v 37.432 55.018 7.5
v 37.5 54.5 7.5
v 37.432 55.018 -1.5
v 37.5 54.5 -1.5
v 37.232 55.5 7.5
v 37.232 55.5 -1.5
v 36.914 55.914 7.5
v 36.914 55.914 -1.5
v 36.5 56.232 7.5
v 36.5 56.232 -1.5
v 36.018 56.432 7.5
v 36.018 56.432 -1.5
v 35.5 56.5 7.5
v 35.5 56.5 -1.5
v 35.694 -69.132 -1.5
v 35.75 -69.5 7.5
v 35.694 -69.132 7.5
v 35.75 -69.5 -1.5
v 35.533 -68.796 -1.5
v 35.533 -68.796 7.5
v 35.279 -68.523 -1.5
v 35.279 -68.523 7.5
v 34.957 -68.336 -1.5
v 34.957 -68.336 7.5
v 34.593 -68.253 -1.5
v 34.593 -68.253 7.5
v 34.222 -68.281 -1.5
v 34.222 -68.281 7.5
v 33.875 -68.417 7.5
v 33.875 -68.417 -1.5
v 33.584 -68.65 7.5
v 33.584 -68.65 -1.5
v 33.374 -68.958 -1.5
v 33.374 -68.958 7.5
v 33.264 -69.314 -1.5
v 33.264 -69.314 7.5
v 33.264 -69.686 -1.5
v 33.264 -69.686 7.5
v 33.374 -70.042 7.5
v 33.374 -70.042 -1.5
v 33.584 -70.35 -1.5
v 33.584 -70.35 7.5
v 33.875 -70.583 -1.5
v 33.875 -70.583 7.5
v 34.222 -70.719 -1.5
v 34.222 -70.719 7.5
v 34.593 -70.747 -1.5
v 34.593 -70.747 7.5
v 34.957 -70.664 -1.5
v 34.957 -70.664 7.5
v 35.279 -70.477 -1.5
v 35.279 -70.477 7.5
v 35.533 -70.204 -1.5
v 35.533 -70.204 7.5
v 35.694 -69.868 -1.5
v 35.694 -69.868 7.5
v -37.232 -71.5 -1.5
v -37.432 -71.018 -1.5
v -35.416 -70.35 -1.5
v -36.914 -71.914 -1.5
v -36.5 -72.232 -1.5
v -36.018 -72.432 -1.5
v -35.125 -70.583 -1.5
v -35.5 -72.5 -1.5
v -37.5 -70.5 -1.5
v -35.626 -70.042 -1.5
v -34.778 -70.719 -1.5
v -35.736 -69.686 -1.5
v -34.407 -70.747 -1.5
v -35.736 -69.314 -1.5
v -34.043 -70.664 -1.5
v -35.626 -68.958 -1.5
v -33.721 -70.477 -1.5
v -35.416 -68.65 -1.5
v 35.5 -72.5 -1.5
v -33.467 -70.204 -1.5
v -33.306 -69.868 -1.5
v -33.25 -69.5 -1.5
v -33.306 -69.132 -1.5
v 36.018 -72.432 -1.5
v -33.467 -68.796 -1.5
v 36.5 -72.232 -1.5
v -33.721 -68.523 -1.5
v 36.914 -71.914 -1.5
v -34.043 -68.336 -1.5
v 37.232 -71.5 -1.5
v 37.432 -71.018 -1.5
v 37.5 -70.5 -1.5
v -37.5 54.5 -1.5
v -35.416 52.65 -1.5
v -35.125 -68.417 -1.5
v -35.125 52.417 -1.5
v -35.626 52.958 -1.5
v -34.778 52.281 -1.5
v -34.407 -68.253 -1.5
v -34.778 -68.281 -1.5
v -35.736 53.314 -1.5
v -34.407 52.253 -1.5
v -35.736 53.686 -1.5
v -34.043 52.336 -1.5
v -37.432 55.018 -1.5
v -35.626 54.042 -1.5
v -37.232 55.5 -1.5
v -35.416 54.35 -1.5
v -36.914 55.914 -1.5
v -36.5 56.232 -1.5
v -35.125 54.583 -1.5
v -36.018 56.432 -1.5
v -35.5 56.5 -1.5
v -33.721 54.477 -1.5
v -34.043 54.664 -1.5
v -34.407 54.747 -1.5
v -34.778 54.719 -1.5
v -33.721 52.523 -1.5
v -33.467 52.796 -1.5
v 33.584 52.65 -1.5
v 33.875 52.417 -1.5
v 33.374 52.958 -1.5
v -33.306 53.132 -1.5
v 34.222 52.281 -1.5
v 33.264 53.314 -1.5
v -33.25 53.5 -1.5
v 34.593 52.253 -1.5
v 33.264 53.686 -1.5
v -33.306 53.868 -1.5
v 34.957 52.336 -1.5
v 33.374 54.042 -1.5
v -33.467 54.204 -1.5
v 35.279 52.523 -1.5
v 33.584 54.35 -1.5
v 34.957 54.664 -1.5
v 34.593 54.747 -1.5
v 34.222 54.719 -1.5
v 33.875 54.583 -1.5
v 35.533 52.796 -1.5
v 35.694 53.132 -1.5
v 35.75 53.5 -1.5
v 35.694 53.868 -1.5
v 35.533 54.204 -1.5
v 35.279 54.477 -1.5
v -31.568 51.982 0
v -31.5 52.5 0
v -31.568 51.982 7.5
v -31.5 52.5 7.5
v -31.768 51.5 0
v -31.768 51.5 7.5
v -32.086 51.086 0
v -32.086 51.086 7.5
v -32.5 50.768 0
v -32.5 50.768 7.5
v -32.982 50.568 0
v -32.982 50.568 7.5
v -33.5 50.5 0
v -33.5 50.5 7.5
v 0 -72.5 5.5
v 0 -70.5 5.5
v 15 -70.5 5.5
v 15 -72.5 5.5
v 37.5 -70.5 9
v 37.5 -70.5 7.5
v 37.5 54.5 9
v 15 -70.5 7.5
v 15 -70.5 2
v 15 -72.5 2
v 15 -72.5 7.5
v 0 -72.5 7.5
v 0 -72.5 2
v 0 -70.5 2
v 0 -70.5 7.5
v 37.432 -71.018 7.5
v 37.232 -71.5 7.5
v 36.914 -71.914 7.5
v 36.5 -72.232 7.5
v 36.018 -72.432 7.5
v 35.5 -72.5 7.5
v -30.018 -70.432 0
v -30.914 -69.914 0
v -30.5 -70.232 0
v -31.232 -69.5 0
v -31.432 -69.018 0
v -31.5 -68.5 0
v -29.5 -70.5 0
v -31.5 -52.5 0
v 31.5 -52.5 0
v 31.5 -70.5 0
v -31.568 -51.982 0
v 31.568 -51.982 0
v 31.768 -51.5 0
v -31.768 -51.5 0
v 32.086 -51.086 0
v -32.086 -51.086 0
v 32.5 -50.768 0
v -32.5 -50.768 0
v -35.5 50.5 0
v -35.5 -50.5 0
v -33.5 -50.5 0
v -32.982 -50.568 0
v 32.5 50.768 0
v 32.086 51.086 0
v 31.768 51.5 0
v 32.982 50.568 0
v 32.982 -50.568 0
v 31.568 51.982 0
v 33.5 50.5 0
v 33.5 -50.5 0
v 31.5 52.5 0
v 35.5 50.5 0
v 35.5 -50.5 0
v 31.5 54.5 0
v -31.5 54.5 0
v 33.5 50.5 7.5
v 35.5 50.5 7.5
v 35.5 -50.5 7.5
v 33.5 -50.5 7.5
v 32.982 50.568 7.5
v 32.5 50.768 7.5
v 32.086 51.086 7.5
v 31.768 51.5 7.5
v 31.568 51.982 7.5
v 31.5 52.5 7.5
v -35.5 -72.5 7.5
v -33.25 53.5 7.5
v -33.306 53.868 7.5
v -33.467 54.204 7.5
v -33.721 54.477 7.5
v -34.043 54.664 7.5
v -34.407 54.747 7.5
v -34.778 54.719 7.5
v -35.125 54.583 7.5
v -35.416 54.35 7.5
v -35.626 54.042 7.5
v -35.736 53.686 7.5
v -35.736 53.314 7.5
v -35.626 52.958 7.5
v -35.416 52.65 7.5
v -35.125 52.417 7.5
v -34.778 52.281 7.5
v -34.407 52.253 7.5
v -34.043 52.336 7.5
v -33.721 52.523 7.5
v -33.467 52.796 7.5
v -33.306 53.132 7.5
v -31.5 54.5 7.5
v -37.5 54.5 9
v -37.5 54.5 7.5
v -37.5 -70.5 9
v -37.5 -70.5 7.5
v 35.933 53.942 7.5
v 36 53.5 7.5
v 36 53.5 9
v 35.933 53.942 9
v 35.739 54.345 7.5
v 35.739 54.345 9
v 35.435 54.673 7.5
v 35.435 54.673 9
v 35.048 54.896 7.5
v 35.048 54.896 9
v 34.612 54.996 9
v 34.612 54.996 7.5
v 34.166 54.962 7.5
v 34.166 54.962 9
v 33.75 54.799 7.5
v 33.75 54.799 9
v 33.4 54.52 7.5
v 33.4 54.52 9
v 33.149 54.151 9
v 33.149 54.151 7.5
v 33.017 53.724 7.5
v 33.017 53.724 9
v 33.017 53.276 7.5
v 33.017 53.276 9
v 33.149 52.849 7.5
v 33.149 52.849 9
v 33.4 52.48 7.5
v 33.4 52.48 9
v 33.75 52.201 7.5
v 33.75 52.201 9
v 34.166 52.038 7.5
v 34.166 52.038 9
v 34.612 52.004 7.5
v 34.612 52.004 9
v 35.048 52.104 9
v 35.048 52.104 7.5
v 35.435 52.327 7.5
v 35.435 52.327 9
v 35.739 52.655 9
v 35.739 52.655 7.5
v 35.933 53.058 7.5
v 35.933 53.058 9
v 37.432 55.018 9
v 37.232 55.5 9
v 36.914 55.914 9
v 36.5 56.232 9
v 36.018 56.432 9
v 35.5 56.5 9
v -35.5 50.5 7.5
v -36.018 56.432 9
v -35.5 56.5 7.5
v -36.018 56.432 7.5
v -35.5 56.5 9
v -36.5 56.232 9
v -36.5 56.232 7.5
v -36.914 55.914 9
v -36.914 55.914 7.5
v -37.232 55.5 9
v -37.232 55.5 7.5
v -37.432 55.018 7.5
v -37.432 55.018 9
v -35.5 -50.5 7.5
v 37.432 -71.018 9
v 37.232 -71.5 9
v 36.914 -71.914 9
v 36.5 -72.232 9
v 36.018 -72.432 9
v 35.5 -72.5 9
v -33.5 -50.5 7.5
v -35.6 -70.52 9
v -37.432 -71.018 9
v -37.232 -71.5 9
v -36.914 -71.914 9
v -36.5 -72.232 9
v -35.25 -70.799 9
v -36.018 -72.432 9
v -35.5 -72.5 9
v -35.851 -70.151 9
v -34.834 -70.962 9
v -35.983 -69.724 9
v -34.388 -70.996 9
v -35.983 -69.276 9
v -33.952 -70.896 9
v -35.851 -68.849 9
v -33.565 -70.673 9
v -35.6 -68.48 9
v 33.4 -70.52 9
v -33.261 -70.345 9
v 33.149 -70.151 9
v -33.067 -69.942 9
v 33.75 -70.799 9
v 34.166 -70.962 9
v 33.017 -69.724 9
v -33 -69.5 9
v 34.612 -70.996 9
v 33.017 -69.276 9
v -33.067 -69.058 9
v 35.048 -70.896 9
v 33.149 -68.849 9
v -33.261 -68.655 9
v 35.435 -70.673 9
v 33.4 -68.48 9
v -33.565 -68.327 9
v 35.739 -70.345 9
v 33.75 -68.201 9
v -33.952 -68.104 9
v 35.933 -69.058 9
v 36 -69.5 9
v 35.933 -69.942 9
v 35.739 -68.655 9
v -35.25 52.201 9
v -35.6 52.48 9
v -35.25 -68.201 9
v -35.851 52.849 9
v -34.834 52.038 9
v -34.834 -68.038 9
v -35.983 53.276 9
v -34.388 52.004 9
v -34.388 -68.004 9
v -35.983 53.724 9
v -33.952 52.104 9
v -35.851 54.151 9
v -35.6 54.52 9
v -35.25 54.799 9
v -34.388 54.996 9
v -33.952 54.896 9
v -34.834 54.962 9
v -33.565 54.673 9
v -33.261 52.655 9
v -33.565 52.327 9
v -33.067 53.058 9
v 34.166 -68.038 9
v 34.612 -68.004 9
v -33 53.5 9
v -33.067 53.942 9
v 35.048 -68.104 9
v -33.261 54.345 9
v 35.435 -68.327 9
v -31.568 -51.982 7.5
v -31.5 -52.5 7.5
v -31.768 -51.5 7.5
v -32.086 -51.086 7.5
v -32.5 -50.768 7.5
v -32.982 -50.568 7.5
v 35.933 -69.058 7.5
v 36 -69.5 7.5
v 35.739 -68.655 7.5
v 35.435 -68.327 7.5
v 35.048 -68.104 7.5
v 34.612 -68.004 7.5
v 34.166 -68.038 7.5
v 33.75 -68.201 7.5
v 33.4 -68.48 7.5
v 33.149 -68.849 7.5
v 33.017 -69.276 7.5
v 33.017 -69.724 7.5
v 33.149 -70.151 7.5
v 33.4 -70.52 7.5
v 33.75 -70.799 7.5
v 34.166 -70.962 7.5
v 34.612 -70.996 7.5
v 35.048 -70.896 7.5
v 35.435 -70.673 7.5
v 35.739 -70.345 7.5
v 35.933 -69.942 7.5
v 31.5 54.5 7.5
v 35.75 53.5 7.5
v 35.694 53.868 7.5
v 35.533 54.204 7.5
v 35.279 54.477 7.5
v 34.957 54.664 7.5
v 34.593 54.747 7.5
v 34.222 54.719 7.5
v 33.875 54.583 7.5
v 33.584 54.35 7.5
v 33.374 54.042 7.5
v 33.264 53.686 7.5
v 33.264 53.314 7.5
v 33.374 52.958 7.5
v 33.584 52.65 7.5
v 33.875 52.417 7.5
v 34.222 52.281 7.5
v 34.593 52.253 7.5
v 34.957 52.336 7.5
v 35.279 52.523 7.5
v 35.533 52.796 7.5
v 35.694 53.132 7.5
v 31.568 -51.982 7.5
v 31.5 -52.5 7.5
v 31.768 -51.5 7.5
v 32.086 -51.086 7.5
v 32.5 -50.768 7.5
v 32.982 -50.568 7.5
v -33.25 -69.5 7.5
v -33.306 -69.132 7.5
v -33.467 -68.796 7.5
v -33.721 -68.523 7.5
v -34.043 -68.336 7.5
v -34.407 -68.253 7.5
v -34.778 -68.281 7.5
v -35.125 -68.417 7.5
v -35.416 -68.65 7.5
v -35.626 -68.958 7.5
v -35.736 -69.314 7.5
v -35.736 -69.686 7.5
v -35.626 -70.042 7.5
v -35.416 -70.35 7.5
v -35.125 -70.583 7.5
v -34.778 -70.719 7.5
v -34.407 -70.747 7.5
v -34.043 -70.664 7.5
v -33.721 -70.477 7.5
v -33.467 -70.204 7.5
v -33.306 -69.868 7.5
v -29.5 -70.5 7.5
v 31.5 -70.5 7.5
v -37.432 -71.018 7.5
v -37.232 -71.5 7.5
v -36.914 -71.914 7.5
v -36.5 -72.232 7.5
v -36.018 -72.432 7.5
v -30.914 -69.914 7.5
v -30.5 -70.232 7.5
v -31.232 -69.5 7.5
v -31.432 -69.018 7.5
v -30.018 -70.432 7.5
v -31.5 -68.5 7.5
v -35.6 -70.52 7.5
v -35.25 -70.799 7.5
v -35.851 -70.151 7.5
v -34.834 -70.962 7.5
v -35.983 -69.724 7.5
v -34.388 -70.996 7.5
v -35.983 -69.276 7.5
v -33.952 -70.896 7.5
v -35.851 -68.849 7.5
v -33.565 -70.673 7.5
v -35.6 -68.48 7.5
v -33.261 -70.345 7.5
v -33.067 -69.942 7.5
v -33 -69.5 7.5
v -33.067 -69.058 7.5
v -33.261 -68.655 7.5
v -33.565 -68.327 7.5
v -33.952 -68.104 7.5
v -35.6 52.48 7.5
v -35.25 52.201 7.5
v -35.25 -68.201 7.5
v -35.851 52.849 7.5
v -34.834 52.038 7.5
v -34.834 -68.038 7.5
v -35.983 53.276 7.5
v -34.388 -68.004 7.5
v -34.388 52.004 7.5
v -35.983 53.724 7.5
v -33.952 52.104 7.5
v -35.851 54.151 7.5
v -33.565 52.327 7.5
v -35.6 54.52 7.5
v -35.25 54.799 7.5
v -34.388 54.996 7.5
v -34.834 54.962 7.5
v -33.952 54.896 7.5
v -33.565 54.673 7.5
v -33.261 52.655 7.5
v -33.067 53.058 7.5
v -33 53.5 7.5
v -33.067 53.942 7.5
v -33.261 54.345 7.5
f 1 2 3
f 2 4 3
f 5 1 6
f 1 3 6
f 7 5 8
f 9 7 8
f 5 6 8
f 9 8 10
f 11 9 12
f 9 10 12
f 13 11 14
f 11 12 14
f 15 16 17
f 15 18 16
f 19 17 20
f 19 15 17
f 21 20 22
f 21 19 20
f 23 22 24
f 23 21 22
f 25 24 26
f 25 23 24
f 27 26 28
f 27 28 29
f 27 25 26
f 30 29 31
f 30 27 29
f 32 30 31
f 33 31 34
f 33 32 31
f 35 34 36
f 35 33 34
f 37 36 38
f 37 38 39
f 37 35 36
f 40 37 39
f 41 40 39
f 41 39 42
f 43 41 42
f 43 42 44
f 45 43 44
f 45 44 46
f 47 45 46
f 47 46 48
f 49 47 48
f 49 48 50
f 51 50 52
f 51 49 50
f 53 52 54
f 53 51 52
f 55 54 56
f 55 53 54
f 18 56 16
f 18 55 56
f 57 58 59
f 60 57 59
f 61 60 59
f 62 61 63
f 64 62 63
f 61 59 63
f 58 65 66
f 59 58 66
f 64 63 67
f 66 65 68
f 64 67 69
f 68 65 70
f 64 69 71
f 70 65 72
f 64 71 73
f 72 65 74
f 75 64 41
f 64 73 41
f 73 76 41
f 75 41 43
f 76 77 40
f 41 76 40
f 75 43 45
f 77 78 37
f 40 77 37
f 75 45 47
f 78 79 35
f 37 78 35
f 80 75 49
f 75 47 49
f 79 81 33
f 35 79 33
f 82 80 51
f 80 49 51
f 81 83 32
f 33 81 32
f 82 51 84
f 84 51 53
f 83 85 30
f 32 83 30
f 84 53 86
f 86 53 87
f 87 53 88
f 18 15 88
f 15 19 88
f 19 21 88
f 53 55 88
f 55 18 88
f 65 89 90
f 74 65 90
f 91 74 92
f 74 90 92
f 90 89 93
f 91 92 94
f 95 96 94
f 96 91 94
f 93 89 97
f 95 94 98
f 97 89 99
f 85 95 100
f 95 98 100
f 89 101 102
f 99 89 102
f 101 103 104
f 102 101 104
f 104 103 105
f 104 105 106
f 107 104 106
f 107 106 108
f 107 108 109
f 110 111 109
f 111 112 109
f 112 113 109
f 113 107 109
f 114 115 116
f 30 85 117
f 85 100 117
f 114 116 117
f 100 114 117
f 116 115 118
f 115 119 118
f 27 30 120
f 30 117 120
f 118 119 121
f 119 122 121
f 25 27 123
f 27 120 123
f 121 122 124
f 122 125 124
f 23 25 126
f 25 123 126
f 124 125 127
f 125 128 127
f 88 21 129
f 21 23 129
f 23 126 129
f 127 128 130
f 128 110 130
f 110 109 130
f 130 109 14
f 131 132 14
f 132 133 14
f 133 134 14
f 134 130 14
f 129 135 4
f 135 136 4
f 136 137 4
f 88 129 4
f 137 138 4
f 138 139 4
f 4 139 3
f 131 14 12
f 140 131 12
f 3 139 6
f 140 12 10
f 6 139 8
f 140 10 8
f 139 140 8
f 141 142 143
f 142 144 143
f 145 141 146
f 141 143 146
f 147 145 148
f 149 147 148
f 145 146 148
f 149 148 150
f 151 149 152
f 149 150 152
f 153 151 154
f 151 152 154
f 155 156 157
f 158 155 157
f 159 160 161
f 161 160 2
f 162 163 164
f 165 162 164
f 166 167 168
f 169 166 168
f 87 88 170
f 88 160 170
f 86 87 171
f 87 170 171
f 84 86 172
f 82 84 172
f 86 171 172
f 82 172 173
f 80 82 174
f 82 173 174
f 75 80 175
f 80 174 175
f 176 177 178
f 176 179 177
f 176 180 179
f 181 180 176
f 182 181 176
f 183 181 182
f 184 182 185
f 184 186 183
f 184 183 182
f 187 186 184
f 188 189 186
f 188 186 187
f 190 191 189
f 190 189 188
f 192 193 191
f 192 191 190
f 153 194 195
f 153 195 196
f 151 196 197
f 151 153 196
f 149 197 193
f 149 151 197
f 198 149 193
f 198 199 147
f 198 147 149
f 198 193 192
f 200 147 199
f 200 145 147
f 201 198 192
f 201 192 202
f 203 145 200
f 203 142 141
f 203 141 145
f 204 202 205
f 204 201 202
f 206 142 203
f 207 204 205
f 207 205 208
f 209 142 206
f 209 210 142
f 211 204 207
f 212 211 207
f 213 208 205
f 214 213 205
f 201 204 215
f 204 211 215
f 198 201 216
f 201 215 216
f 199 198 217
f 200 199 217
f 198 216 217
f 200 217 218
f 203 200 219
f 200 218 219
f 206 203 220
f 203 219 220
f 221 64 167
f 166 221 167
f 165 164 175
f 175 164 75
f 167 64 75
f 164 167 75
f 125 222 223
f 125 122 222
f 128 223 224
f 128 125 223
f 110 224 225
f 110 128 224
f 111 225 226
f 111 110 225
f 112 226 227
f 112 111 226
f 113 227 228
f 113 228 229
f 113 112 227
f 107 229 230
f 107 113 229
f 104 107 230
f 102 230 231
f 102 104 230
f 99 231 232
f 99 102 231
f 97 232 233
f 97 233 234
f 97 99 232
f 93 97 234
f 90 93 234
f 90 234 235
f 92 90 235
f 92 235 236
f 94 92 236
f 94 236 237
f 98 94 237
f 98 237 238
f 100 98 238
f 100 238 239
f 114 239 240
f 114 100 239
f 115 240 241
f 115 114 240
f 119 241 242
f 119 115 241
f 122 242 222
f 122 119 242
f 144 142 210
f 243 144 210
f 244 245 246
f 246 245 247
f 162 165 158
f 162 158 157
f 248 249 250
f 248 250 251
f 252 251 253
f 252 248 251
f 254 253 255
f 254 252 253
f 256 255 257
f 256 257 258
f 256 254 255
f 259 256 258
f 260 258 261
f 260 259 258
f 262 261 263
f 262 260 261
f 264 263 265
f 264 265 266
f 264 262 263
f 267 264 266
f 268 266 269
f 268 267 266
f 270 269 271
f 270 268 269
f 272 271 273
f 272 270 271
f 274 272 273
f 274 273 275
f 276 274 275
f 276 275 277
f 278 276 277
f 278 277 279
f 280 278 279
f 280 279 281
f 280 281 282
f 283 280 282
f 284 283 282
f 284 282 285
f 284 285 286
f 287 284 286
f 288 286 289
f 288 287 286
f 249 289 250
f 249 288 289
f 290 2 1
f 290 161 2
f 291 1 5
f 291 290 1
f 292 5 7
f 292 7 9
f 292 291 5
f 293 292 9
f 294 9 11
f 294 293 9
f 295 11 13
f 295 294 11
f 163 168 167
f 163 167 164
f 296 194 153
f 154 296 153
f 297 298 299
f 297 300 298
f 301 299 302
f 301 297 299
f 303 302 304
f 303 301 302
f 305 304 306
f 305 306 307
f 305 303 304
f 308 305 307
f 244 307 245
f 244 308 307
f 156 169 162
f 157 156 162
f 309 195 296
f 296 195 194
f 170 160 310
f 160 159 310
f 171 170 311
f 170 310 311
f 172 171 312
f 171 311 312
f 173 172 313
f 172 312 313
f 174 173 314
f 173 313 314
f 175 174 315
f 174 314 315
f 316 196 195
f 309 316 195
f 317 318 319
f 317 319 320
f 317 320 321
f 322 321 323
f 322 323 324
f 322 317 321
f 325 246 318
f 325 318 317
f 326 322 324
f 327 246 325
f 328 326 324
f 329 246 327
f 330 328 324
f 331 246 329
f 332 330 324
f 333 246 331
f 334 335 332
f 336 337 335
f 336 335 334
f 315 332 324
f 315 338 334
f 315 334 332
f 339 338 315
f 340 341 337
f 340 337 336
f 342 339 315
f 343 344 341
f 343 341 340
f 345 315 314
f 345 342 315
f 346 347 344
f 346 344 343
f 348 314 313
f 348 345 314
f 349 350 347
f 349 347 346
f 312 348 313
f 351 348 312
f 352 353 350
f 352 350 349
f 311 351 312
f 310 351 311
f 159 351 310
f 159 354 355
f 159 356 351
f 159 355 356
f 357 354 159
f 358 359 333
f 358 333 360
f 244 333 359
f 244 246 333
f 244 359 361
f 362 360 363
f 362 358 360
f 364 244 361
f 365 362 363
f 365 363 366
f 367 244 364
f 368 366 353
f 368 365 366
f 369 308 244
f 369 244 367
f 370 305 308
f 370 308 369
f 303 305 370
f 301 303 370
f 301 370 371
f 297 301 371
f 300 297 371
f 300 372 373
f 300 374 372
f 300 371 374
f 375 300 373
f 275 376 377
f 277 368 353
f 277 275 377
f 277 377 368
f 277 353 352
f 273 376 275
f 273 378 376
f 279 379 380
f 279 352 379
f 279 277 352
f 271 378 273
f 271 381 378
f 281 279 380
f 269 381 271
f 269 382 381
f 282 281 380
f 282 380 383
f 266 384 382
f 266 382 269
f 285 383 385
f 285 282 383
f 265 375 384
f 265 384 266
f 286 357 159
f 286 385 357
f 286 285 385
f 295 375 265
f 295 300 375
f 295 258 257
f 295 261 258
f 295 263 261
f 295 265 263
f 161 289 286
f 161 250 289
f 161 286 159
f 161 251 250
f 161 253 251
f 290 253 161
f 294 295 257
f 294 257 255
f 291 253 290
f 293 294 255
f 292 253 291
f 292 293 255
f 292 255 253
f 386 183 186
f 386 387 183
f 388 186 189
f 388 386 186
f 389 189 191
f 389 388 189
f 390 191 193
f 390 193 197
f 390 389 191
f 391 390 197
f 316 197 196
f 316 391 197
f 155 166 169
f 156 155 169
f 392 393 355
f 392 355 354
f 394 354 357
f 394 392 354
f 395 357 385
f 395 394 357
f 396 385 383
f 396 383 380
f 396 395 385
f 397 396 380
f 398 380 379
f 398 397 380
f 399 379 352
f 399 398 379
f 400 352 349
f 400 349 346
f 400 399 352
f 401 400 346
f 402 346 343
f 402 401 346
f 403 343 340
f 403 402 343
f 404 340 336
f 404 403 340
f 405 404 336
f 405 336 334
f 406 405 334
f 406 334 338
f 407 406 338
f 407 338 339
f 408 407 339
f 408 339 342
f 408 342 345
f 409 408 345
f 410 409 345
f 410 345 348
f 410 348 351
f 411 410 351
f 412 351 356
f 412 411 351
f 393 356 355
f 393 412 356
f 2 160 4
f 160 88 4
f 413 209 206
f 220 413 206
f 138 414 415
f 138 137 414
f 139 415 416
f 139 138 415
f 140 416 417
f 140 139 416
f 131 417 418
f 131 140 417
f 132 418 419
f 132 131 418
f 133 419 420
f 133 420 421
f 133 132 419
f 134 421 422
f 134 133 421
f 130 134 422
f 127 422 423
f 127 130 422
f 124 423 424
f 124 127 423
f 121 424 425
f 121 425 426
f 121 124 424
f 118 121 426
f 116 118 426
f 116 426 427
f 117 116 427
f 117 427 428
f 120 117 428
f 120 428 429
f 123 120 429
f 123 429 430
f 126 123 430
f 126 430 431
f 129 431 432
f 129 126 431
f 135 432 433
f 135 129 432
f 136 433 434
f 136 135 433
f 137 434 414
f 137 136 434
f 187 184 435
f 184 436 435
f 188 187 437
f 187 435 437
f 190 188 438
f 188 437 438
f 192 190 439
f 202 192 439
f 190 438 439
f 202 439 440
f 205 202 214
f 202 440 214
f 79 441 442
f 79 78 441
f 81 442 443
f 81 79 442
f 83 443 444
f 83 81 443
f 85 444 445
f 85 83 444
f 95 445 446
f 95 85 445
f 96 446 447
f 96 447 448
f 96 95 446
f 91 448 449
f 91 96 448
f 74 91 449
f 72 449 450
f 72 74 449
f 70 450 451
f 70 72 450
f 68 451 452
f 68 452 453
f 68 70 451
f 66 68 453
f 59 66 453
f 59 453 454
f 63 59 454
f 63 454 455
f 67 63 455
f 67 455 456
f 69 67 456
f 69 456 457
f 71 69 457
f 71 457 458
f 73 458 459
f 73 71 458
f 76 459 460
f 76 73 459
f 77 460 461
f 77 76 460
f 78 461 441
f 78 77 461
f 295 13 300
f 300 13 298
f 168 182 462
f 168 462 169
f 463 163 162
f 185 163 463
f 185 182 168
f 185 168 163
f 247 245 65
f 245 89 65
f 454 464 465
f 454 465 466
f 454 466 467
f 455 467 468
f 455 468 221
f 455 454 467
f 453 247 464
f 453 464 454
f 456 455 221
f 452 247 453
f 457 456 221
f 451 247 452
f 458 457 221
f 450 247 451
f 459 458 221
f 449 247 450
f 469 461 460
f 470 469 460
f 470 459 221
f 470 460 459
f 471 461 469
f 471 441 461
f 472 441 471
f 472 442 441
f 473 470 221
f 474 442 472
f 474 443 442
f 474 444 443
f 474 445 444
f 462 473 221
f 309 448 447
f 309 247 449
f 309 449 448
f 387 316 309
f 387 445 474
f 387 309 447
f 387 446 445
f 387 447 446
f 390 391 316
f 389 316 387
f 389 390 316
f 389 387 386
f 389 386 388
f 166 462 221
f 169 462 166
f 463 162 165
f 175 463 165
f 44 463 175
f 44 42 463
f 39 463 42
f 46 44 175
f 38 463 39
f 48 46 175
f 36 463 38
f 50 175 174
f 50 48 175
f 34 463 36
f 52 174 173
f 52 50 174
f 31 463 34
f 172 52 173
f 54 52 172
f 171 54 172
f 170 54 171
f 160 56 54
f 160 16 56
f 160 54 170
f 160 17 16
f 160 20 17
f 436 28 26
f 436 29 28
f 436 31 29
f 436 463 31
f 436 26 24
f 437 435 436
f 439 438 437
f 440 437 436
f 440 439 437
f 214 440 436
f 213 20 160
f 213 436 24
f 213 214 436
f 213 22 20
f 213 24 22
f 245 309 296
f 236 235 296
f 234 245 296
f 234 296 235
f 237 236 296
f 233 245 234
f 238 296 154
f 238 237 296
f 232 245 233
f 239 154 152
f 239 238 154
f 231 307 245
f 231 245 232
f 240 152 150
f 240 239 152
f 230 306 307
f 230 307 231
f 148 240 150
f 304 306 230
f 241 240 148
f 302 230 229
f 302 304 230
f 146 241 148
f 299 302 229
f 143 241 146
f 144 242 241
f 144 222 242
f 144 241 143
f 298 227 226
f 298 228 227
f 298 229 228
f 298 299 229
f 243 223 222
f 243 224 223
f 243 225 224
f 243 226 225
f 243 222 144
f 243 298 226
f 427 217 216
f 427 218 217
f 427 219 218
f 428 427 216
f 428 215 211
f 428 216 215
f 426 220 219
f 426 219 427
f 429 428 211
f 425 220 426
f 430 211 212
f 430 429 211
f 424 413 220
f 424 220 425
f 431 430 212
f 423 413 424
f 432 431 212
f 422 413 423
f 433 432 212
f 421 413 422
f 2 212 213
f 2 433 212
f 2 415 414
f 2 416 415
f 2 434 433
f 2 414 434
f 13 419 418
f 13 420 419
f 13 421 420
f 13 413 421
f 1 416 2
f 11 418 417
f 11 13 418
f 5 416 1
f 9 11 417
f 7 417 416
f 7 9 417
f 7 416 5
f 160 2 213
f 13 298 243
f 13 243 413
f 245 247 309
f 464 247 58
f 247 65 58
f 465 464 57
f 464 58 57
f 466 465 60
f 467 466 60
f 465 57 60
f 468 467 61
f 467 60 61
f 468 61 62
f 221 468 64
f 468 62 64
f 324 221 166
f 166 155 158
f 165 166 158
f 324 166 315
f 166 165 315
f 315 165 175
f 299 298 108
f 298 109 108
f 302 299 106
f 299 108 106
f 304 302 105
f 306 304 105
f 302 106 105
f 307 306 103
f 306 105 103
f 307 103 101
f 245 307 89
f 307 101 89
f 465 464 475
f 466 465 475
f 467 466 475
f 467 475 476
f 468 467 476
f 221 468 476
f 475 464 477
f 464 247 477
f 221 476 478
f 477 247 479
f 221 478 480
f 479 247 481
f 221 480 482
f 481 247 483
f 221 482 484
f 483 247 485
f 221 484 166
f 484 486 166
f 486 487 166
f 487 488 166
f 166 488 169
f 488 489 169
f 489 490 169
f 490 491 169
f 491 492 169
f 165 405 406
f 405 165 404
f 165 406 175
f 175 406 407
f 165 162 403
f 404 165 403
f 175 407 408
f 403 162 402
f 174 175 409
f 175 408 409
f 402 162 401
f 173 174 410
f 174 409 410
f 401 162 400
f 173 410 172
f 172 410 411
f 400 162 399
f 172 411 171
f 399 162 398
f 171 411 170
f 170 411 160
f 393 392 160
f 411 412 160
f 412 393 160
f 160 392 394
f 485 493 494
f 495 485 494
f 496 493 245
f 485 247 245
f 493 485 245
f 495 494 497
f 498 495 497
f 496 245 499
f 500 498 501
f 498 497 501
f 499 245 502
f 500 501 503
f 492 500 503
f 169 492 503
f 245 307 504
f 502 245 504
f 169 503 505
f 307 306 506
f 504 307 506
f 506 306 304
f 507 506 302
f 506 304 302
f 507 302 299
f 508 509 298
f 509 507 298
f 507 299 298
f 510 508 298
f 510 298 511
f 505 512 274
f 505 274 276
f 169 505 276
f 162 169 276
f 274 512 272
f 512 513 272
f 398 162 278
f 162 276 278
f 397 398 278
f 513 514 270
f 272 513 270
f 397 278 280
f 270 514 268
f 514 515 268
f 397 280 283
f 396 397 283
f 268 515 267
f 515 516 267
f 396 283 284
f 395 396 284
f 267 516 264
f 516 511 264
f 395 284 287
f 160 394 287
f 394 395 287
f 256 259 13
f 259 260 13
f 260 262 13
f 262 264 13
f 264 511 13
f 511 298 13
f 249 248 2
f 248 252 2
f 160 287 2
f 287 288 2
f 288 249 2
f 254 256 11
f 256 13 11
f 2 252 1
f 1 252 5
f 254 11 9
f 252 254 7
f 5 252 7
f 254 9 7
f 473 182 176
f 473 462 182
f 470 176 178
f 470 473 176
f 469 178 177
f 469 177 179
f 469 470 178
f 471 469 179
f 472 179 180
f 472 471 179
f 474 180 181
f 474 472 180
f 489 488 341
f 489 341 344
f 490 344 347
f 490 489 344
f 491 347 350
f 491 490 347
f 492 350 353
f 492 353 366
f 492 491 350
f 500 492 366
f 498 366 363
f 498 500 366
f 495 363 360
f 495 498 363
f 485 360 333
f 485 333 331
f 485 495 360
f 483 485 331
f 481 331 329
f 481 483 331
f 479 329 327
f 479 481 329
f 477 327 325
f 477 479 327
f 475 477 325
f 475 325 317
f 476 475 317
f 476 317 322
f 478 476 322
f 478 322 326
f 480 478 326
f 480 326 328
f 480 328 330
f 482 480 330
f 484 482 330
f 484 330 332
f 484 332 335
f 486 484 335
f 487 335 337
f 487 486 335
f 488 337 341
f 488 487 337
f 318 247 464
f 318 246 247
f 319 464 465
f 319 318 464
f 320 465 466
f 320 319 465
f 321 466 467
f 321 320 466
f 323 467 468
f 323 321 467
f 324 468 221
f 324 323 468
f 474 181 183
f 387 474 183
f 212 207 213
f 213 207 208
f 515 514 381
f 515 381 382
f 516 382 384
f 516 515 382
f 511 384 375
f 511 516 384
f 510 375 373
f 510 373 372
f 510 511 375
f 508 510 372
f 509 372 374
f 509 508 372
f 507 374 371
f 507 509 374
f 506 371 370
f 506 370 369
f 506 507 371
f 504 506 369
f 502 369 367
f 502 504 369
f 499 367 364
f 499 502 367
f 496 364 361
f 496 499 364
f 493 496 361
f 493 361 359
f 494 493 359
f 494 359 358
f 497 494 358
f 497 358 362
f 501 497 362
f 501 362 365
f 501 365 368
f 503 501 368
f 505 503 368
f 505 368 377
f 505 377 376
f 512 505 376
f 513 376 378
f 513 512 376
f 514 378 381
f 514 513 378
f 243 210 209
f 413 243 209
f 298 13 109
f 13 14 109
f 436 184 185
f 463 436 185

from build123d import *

# Parameters (mm, degrees)
F0_R     = 1.25
F0_W     = 15
F0_H     = 2
F1_DEPTH = 1.5
F2_DEPTH = 7.5
F3_R     = 2
F4_DEPTH = 2
F5_R     = 1.5
F5_W     = 15
F5_H     = 2
F6_DEPTH = 1.5
F7_R     = 2
F8_DEPTH = 2


# Not quite as in the source:
# - a feature names something its author has since deleted; it is built from what else it names


with BuildPart() as f1:
    # F0 (on Top) → F1 (new body)
    with BuildSketch(Plane.XY):
        Polygon((-35.5, -50.5), (-35.5, 50.5), (-31.5, 50.5), (-31.5, 54.5), (31.5, 54.5), (31.5, 50.5), (35.5, 50.5), (35.5, -50.5), (31.5, -50.5), (31.5, -70.5), (15, -70.5), (15, -72.5), (37.5, -72.5), (37.5, -56.5), (37.5, 56.5), (-37.5, 56.5), (-37.5, -56.5), (-37.5, -72.5), (0, -72.5), (0, -70.5), (-31.5, -70.5), (-31.5, -50.5), align=None)
        with Locations((-34.5, -69.5)):
            Circle(F0_R, mode=Mode.SUBTRACT)
        with Locations((34.5, -69.5)):
            Circle(F0_R, mode=Mode.SUBTRACT)
        with Locations((-34.5, 53.5)):
            Circle(F0_R, mode=Mode.SUBTRACT)
        with Locations((34.5, 53.5)):
            Circle(F0_R, mode=Mode.SUBTRACT)
        Polygon((-31.5, 50.5), (-35.5, 50.5), (-35.5, -50.5), (-31.5, -50.5), (-31.5, -70.5), (0, -70.5), (15, -70.5), (31.5, -70.5), (31.5, -50.5), (35.5, -50.5), (35.5, 50.5), (31.5, 50.5), (31.5, 54.5), (-31.5, 54.5), align=None)
        with Locations((7.5, -71.5)):
            Rectangle(F0_W, F0_H)
    extrude(amount=-F1_DEPTH)

    # F0 (on Top) → F2 (join)
    with BuildSketch(Plane.XY):
        Polygon((-35.5, -50.5), (-35.5, 50.5), (-31.5, 50.5), (-31.5, 54.5), (31.5, 54.5), (31.5, 50.5), (35.5, 50.5), (35.5, -50.5), (31.5, -50.5), (31.5, -70.5), (15, -70.5), (15, -72.5), (37.5, -72.5), (37.5, -56.5), (37.5, 56.5), (-37.5, 56.5), (-37.5, -56.5), (-37.5, -72.5), (0, -72.5), (0, -70.5), (-31.5, -70.5), (-31.5, -50.5), align=None)
        with Locations((-34.5, -69.5)):
            Circle(F0_R, mode=Mode.SUBTRACT)
        with Locations((34.5, -69.5)):
            Circle(F0_R, mode=Mode.SUBTRACT)
        with Locations((-34.5, 53.5)):
            Circle(F0_R, mode=Mode.SUBTRACT)
        with Locations((34.5, 53.5)):
            Circle(F0_R, mode=Mode.SUBTRACT)
    extrude(amount=F2_DEPTH)

    # F3
    f3_edges = [f1.edges().sort_by_distance(p)[0] for p in [
        (37.5, 56.5, 3),
        (-37.5, 56.5, 3),
        (31.5, -50.5, 3.75),
        (-31.5, 50.5, 3.75),
        (31.5, 50.5, 3.75),
        (-31.5, -50.5, 3.75),
        (37.5, -72.5, 3),
        (-37.5, -72.5, 3),
        (-31.5, -70.5, 3.75),
    ]]
    fillet(f3_edges, radius=F3_R)

    # F0 (on Top) → F4 (join)
    with BuildSketch(Plane.XY):
        with Locations((7.5, -71.5)):
            Rectangle(F0_W, F0_H)
    extrude(amount=F4_DEPTH)


with BuildPart() as f6:
    # F5 (on face) → F6 (new body)
    with BuildSketch(Plane.XY.offset(7.5)):
        Polygon((37.5, -72.5), (37.5, 56.5), (-37.5, 56.5), (-37.5, -72.5), (0, -72.5), (0, -70.5), (15, -70.5), (15, -72.5), align=None)
        with Locations((-34.5, -69.5)):
            Circle(F5_R, mode=Mode.SUBTRACT)
        with Locations((34.5, -69.5)):
            Circle(F5_R, mode=Mode.SUBTRACT)
        with Locations((-34.5, 53.5)):
            Circle(F5_R, mode=Mode.SUBTRACT)
        with Locations((34.5, 53.5)):
            Circle(F5_R, mode=Mode.SUBTRACT)
        with Locations((7.5, -71.5)):
            Rectangle(F5_W, F5_H)
    extrude(amount=F6_DEPTH)

    # F7
    f7_edges = [f6.edges().sort_by_distance(p)[0] for p in [
        (-37.5, 56.5, 8.25),
        (37.5, 56.5, 8.25),
        (-37.5, -72.5, 8.25),
        (37.5, -72.5, 8.25),
    ]]
    fillet(f7_edges, radius=F7_R)

    # F5 (on face) → F8 (join)
    with BuildSketch(Plane.XY.offset(7.5)):
        with Locations((7.5, -71.5)):
            Rectangle(F5_W, F5_H)
    extrude(amount=-F8_DEPTH)


solid = Compound([f1.part, f6.part])
